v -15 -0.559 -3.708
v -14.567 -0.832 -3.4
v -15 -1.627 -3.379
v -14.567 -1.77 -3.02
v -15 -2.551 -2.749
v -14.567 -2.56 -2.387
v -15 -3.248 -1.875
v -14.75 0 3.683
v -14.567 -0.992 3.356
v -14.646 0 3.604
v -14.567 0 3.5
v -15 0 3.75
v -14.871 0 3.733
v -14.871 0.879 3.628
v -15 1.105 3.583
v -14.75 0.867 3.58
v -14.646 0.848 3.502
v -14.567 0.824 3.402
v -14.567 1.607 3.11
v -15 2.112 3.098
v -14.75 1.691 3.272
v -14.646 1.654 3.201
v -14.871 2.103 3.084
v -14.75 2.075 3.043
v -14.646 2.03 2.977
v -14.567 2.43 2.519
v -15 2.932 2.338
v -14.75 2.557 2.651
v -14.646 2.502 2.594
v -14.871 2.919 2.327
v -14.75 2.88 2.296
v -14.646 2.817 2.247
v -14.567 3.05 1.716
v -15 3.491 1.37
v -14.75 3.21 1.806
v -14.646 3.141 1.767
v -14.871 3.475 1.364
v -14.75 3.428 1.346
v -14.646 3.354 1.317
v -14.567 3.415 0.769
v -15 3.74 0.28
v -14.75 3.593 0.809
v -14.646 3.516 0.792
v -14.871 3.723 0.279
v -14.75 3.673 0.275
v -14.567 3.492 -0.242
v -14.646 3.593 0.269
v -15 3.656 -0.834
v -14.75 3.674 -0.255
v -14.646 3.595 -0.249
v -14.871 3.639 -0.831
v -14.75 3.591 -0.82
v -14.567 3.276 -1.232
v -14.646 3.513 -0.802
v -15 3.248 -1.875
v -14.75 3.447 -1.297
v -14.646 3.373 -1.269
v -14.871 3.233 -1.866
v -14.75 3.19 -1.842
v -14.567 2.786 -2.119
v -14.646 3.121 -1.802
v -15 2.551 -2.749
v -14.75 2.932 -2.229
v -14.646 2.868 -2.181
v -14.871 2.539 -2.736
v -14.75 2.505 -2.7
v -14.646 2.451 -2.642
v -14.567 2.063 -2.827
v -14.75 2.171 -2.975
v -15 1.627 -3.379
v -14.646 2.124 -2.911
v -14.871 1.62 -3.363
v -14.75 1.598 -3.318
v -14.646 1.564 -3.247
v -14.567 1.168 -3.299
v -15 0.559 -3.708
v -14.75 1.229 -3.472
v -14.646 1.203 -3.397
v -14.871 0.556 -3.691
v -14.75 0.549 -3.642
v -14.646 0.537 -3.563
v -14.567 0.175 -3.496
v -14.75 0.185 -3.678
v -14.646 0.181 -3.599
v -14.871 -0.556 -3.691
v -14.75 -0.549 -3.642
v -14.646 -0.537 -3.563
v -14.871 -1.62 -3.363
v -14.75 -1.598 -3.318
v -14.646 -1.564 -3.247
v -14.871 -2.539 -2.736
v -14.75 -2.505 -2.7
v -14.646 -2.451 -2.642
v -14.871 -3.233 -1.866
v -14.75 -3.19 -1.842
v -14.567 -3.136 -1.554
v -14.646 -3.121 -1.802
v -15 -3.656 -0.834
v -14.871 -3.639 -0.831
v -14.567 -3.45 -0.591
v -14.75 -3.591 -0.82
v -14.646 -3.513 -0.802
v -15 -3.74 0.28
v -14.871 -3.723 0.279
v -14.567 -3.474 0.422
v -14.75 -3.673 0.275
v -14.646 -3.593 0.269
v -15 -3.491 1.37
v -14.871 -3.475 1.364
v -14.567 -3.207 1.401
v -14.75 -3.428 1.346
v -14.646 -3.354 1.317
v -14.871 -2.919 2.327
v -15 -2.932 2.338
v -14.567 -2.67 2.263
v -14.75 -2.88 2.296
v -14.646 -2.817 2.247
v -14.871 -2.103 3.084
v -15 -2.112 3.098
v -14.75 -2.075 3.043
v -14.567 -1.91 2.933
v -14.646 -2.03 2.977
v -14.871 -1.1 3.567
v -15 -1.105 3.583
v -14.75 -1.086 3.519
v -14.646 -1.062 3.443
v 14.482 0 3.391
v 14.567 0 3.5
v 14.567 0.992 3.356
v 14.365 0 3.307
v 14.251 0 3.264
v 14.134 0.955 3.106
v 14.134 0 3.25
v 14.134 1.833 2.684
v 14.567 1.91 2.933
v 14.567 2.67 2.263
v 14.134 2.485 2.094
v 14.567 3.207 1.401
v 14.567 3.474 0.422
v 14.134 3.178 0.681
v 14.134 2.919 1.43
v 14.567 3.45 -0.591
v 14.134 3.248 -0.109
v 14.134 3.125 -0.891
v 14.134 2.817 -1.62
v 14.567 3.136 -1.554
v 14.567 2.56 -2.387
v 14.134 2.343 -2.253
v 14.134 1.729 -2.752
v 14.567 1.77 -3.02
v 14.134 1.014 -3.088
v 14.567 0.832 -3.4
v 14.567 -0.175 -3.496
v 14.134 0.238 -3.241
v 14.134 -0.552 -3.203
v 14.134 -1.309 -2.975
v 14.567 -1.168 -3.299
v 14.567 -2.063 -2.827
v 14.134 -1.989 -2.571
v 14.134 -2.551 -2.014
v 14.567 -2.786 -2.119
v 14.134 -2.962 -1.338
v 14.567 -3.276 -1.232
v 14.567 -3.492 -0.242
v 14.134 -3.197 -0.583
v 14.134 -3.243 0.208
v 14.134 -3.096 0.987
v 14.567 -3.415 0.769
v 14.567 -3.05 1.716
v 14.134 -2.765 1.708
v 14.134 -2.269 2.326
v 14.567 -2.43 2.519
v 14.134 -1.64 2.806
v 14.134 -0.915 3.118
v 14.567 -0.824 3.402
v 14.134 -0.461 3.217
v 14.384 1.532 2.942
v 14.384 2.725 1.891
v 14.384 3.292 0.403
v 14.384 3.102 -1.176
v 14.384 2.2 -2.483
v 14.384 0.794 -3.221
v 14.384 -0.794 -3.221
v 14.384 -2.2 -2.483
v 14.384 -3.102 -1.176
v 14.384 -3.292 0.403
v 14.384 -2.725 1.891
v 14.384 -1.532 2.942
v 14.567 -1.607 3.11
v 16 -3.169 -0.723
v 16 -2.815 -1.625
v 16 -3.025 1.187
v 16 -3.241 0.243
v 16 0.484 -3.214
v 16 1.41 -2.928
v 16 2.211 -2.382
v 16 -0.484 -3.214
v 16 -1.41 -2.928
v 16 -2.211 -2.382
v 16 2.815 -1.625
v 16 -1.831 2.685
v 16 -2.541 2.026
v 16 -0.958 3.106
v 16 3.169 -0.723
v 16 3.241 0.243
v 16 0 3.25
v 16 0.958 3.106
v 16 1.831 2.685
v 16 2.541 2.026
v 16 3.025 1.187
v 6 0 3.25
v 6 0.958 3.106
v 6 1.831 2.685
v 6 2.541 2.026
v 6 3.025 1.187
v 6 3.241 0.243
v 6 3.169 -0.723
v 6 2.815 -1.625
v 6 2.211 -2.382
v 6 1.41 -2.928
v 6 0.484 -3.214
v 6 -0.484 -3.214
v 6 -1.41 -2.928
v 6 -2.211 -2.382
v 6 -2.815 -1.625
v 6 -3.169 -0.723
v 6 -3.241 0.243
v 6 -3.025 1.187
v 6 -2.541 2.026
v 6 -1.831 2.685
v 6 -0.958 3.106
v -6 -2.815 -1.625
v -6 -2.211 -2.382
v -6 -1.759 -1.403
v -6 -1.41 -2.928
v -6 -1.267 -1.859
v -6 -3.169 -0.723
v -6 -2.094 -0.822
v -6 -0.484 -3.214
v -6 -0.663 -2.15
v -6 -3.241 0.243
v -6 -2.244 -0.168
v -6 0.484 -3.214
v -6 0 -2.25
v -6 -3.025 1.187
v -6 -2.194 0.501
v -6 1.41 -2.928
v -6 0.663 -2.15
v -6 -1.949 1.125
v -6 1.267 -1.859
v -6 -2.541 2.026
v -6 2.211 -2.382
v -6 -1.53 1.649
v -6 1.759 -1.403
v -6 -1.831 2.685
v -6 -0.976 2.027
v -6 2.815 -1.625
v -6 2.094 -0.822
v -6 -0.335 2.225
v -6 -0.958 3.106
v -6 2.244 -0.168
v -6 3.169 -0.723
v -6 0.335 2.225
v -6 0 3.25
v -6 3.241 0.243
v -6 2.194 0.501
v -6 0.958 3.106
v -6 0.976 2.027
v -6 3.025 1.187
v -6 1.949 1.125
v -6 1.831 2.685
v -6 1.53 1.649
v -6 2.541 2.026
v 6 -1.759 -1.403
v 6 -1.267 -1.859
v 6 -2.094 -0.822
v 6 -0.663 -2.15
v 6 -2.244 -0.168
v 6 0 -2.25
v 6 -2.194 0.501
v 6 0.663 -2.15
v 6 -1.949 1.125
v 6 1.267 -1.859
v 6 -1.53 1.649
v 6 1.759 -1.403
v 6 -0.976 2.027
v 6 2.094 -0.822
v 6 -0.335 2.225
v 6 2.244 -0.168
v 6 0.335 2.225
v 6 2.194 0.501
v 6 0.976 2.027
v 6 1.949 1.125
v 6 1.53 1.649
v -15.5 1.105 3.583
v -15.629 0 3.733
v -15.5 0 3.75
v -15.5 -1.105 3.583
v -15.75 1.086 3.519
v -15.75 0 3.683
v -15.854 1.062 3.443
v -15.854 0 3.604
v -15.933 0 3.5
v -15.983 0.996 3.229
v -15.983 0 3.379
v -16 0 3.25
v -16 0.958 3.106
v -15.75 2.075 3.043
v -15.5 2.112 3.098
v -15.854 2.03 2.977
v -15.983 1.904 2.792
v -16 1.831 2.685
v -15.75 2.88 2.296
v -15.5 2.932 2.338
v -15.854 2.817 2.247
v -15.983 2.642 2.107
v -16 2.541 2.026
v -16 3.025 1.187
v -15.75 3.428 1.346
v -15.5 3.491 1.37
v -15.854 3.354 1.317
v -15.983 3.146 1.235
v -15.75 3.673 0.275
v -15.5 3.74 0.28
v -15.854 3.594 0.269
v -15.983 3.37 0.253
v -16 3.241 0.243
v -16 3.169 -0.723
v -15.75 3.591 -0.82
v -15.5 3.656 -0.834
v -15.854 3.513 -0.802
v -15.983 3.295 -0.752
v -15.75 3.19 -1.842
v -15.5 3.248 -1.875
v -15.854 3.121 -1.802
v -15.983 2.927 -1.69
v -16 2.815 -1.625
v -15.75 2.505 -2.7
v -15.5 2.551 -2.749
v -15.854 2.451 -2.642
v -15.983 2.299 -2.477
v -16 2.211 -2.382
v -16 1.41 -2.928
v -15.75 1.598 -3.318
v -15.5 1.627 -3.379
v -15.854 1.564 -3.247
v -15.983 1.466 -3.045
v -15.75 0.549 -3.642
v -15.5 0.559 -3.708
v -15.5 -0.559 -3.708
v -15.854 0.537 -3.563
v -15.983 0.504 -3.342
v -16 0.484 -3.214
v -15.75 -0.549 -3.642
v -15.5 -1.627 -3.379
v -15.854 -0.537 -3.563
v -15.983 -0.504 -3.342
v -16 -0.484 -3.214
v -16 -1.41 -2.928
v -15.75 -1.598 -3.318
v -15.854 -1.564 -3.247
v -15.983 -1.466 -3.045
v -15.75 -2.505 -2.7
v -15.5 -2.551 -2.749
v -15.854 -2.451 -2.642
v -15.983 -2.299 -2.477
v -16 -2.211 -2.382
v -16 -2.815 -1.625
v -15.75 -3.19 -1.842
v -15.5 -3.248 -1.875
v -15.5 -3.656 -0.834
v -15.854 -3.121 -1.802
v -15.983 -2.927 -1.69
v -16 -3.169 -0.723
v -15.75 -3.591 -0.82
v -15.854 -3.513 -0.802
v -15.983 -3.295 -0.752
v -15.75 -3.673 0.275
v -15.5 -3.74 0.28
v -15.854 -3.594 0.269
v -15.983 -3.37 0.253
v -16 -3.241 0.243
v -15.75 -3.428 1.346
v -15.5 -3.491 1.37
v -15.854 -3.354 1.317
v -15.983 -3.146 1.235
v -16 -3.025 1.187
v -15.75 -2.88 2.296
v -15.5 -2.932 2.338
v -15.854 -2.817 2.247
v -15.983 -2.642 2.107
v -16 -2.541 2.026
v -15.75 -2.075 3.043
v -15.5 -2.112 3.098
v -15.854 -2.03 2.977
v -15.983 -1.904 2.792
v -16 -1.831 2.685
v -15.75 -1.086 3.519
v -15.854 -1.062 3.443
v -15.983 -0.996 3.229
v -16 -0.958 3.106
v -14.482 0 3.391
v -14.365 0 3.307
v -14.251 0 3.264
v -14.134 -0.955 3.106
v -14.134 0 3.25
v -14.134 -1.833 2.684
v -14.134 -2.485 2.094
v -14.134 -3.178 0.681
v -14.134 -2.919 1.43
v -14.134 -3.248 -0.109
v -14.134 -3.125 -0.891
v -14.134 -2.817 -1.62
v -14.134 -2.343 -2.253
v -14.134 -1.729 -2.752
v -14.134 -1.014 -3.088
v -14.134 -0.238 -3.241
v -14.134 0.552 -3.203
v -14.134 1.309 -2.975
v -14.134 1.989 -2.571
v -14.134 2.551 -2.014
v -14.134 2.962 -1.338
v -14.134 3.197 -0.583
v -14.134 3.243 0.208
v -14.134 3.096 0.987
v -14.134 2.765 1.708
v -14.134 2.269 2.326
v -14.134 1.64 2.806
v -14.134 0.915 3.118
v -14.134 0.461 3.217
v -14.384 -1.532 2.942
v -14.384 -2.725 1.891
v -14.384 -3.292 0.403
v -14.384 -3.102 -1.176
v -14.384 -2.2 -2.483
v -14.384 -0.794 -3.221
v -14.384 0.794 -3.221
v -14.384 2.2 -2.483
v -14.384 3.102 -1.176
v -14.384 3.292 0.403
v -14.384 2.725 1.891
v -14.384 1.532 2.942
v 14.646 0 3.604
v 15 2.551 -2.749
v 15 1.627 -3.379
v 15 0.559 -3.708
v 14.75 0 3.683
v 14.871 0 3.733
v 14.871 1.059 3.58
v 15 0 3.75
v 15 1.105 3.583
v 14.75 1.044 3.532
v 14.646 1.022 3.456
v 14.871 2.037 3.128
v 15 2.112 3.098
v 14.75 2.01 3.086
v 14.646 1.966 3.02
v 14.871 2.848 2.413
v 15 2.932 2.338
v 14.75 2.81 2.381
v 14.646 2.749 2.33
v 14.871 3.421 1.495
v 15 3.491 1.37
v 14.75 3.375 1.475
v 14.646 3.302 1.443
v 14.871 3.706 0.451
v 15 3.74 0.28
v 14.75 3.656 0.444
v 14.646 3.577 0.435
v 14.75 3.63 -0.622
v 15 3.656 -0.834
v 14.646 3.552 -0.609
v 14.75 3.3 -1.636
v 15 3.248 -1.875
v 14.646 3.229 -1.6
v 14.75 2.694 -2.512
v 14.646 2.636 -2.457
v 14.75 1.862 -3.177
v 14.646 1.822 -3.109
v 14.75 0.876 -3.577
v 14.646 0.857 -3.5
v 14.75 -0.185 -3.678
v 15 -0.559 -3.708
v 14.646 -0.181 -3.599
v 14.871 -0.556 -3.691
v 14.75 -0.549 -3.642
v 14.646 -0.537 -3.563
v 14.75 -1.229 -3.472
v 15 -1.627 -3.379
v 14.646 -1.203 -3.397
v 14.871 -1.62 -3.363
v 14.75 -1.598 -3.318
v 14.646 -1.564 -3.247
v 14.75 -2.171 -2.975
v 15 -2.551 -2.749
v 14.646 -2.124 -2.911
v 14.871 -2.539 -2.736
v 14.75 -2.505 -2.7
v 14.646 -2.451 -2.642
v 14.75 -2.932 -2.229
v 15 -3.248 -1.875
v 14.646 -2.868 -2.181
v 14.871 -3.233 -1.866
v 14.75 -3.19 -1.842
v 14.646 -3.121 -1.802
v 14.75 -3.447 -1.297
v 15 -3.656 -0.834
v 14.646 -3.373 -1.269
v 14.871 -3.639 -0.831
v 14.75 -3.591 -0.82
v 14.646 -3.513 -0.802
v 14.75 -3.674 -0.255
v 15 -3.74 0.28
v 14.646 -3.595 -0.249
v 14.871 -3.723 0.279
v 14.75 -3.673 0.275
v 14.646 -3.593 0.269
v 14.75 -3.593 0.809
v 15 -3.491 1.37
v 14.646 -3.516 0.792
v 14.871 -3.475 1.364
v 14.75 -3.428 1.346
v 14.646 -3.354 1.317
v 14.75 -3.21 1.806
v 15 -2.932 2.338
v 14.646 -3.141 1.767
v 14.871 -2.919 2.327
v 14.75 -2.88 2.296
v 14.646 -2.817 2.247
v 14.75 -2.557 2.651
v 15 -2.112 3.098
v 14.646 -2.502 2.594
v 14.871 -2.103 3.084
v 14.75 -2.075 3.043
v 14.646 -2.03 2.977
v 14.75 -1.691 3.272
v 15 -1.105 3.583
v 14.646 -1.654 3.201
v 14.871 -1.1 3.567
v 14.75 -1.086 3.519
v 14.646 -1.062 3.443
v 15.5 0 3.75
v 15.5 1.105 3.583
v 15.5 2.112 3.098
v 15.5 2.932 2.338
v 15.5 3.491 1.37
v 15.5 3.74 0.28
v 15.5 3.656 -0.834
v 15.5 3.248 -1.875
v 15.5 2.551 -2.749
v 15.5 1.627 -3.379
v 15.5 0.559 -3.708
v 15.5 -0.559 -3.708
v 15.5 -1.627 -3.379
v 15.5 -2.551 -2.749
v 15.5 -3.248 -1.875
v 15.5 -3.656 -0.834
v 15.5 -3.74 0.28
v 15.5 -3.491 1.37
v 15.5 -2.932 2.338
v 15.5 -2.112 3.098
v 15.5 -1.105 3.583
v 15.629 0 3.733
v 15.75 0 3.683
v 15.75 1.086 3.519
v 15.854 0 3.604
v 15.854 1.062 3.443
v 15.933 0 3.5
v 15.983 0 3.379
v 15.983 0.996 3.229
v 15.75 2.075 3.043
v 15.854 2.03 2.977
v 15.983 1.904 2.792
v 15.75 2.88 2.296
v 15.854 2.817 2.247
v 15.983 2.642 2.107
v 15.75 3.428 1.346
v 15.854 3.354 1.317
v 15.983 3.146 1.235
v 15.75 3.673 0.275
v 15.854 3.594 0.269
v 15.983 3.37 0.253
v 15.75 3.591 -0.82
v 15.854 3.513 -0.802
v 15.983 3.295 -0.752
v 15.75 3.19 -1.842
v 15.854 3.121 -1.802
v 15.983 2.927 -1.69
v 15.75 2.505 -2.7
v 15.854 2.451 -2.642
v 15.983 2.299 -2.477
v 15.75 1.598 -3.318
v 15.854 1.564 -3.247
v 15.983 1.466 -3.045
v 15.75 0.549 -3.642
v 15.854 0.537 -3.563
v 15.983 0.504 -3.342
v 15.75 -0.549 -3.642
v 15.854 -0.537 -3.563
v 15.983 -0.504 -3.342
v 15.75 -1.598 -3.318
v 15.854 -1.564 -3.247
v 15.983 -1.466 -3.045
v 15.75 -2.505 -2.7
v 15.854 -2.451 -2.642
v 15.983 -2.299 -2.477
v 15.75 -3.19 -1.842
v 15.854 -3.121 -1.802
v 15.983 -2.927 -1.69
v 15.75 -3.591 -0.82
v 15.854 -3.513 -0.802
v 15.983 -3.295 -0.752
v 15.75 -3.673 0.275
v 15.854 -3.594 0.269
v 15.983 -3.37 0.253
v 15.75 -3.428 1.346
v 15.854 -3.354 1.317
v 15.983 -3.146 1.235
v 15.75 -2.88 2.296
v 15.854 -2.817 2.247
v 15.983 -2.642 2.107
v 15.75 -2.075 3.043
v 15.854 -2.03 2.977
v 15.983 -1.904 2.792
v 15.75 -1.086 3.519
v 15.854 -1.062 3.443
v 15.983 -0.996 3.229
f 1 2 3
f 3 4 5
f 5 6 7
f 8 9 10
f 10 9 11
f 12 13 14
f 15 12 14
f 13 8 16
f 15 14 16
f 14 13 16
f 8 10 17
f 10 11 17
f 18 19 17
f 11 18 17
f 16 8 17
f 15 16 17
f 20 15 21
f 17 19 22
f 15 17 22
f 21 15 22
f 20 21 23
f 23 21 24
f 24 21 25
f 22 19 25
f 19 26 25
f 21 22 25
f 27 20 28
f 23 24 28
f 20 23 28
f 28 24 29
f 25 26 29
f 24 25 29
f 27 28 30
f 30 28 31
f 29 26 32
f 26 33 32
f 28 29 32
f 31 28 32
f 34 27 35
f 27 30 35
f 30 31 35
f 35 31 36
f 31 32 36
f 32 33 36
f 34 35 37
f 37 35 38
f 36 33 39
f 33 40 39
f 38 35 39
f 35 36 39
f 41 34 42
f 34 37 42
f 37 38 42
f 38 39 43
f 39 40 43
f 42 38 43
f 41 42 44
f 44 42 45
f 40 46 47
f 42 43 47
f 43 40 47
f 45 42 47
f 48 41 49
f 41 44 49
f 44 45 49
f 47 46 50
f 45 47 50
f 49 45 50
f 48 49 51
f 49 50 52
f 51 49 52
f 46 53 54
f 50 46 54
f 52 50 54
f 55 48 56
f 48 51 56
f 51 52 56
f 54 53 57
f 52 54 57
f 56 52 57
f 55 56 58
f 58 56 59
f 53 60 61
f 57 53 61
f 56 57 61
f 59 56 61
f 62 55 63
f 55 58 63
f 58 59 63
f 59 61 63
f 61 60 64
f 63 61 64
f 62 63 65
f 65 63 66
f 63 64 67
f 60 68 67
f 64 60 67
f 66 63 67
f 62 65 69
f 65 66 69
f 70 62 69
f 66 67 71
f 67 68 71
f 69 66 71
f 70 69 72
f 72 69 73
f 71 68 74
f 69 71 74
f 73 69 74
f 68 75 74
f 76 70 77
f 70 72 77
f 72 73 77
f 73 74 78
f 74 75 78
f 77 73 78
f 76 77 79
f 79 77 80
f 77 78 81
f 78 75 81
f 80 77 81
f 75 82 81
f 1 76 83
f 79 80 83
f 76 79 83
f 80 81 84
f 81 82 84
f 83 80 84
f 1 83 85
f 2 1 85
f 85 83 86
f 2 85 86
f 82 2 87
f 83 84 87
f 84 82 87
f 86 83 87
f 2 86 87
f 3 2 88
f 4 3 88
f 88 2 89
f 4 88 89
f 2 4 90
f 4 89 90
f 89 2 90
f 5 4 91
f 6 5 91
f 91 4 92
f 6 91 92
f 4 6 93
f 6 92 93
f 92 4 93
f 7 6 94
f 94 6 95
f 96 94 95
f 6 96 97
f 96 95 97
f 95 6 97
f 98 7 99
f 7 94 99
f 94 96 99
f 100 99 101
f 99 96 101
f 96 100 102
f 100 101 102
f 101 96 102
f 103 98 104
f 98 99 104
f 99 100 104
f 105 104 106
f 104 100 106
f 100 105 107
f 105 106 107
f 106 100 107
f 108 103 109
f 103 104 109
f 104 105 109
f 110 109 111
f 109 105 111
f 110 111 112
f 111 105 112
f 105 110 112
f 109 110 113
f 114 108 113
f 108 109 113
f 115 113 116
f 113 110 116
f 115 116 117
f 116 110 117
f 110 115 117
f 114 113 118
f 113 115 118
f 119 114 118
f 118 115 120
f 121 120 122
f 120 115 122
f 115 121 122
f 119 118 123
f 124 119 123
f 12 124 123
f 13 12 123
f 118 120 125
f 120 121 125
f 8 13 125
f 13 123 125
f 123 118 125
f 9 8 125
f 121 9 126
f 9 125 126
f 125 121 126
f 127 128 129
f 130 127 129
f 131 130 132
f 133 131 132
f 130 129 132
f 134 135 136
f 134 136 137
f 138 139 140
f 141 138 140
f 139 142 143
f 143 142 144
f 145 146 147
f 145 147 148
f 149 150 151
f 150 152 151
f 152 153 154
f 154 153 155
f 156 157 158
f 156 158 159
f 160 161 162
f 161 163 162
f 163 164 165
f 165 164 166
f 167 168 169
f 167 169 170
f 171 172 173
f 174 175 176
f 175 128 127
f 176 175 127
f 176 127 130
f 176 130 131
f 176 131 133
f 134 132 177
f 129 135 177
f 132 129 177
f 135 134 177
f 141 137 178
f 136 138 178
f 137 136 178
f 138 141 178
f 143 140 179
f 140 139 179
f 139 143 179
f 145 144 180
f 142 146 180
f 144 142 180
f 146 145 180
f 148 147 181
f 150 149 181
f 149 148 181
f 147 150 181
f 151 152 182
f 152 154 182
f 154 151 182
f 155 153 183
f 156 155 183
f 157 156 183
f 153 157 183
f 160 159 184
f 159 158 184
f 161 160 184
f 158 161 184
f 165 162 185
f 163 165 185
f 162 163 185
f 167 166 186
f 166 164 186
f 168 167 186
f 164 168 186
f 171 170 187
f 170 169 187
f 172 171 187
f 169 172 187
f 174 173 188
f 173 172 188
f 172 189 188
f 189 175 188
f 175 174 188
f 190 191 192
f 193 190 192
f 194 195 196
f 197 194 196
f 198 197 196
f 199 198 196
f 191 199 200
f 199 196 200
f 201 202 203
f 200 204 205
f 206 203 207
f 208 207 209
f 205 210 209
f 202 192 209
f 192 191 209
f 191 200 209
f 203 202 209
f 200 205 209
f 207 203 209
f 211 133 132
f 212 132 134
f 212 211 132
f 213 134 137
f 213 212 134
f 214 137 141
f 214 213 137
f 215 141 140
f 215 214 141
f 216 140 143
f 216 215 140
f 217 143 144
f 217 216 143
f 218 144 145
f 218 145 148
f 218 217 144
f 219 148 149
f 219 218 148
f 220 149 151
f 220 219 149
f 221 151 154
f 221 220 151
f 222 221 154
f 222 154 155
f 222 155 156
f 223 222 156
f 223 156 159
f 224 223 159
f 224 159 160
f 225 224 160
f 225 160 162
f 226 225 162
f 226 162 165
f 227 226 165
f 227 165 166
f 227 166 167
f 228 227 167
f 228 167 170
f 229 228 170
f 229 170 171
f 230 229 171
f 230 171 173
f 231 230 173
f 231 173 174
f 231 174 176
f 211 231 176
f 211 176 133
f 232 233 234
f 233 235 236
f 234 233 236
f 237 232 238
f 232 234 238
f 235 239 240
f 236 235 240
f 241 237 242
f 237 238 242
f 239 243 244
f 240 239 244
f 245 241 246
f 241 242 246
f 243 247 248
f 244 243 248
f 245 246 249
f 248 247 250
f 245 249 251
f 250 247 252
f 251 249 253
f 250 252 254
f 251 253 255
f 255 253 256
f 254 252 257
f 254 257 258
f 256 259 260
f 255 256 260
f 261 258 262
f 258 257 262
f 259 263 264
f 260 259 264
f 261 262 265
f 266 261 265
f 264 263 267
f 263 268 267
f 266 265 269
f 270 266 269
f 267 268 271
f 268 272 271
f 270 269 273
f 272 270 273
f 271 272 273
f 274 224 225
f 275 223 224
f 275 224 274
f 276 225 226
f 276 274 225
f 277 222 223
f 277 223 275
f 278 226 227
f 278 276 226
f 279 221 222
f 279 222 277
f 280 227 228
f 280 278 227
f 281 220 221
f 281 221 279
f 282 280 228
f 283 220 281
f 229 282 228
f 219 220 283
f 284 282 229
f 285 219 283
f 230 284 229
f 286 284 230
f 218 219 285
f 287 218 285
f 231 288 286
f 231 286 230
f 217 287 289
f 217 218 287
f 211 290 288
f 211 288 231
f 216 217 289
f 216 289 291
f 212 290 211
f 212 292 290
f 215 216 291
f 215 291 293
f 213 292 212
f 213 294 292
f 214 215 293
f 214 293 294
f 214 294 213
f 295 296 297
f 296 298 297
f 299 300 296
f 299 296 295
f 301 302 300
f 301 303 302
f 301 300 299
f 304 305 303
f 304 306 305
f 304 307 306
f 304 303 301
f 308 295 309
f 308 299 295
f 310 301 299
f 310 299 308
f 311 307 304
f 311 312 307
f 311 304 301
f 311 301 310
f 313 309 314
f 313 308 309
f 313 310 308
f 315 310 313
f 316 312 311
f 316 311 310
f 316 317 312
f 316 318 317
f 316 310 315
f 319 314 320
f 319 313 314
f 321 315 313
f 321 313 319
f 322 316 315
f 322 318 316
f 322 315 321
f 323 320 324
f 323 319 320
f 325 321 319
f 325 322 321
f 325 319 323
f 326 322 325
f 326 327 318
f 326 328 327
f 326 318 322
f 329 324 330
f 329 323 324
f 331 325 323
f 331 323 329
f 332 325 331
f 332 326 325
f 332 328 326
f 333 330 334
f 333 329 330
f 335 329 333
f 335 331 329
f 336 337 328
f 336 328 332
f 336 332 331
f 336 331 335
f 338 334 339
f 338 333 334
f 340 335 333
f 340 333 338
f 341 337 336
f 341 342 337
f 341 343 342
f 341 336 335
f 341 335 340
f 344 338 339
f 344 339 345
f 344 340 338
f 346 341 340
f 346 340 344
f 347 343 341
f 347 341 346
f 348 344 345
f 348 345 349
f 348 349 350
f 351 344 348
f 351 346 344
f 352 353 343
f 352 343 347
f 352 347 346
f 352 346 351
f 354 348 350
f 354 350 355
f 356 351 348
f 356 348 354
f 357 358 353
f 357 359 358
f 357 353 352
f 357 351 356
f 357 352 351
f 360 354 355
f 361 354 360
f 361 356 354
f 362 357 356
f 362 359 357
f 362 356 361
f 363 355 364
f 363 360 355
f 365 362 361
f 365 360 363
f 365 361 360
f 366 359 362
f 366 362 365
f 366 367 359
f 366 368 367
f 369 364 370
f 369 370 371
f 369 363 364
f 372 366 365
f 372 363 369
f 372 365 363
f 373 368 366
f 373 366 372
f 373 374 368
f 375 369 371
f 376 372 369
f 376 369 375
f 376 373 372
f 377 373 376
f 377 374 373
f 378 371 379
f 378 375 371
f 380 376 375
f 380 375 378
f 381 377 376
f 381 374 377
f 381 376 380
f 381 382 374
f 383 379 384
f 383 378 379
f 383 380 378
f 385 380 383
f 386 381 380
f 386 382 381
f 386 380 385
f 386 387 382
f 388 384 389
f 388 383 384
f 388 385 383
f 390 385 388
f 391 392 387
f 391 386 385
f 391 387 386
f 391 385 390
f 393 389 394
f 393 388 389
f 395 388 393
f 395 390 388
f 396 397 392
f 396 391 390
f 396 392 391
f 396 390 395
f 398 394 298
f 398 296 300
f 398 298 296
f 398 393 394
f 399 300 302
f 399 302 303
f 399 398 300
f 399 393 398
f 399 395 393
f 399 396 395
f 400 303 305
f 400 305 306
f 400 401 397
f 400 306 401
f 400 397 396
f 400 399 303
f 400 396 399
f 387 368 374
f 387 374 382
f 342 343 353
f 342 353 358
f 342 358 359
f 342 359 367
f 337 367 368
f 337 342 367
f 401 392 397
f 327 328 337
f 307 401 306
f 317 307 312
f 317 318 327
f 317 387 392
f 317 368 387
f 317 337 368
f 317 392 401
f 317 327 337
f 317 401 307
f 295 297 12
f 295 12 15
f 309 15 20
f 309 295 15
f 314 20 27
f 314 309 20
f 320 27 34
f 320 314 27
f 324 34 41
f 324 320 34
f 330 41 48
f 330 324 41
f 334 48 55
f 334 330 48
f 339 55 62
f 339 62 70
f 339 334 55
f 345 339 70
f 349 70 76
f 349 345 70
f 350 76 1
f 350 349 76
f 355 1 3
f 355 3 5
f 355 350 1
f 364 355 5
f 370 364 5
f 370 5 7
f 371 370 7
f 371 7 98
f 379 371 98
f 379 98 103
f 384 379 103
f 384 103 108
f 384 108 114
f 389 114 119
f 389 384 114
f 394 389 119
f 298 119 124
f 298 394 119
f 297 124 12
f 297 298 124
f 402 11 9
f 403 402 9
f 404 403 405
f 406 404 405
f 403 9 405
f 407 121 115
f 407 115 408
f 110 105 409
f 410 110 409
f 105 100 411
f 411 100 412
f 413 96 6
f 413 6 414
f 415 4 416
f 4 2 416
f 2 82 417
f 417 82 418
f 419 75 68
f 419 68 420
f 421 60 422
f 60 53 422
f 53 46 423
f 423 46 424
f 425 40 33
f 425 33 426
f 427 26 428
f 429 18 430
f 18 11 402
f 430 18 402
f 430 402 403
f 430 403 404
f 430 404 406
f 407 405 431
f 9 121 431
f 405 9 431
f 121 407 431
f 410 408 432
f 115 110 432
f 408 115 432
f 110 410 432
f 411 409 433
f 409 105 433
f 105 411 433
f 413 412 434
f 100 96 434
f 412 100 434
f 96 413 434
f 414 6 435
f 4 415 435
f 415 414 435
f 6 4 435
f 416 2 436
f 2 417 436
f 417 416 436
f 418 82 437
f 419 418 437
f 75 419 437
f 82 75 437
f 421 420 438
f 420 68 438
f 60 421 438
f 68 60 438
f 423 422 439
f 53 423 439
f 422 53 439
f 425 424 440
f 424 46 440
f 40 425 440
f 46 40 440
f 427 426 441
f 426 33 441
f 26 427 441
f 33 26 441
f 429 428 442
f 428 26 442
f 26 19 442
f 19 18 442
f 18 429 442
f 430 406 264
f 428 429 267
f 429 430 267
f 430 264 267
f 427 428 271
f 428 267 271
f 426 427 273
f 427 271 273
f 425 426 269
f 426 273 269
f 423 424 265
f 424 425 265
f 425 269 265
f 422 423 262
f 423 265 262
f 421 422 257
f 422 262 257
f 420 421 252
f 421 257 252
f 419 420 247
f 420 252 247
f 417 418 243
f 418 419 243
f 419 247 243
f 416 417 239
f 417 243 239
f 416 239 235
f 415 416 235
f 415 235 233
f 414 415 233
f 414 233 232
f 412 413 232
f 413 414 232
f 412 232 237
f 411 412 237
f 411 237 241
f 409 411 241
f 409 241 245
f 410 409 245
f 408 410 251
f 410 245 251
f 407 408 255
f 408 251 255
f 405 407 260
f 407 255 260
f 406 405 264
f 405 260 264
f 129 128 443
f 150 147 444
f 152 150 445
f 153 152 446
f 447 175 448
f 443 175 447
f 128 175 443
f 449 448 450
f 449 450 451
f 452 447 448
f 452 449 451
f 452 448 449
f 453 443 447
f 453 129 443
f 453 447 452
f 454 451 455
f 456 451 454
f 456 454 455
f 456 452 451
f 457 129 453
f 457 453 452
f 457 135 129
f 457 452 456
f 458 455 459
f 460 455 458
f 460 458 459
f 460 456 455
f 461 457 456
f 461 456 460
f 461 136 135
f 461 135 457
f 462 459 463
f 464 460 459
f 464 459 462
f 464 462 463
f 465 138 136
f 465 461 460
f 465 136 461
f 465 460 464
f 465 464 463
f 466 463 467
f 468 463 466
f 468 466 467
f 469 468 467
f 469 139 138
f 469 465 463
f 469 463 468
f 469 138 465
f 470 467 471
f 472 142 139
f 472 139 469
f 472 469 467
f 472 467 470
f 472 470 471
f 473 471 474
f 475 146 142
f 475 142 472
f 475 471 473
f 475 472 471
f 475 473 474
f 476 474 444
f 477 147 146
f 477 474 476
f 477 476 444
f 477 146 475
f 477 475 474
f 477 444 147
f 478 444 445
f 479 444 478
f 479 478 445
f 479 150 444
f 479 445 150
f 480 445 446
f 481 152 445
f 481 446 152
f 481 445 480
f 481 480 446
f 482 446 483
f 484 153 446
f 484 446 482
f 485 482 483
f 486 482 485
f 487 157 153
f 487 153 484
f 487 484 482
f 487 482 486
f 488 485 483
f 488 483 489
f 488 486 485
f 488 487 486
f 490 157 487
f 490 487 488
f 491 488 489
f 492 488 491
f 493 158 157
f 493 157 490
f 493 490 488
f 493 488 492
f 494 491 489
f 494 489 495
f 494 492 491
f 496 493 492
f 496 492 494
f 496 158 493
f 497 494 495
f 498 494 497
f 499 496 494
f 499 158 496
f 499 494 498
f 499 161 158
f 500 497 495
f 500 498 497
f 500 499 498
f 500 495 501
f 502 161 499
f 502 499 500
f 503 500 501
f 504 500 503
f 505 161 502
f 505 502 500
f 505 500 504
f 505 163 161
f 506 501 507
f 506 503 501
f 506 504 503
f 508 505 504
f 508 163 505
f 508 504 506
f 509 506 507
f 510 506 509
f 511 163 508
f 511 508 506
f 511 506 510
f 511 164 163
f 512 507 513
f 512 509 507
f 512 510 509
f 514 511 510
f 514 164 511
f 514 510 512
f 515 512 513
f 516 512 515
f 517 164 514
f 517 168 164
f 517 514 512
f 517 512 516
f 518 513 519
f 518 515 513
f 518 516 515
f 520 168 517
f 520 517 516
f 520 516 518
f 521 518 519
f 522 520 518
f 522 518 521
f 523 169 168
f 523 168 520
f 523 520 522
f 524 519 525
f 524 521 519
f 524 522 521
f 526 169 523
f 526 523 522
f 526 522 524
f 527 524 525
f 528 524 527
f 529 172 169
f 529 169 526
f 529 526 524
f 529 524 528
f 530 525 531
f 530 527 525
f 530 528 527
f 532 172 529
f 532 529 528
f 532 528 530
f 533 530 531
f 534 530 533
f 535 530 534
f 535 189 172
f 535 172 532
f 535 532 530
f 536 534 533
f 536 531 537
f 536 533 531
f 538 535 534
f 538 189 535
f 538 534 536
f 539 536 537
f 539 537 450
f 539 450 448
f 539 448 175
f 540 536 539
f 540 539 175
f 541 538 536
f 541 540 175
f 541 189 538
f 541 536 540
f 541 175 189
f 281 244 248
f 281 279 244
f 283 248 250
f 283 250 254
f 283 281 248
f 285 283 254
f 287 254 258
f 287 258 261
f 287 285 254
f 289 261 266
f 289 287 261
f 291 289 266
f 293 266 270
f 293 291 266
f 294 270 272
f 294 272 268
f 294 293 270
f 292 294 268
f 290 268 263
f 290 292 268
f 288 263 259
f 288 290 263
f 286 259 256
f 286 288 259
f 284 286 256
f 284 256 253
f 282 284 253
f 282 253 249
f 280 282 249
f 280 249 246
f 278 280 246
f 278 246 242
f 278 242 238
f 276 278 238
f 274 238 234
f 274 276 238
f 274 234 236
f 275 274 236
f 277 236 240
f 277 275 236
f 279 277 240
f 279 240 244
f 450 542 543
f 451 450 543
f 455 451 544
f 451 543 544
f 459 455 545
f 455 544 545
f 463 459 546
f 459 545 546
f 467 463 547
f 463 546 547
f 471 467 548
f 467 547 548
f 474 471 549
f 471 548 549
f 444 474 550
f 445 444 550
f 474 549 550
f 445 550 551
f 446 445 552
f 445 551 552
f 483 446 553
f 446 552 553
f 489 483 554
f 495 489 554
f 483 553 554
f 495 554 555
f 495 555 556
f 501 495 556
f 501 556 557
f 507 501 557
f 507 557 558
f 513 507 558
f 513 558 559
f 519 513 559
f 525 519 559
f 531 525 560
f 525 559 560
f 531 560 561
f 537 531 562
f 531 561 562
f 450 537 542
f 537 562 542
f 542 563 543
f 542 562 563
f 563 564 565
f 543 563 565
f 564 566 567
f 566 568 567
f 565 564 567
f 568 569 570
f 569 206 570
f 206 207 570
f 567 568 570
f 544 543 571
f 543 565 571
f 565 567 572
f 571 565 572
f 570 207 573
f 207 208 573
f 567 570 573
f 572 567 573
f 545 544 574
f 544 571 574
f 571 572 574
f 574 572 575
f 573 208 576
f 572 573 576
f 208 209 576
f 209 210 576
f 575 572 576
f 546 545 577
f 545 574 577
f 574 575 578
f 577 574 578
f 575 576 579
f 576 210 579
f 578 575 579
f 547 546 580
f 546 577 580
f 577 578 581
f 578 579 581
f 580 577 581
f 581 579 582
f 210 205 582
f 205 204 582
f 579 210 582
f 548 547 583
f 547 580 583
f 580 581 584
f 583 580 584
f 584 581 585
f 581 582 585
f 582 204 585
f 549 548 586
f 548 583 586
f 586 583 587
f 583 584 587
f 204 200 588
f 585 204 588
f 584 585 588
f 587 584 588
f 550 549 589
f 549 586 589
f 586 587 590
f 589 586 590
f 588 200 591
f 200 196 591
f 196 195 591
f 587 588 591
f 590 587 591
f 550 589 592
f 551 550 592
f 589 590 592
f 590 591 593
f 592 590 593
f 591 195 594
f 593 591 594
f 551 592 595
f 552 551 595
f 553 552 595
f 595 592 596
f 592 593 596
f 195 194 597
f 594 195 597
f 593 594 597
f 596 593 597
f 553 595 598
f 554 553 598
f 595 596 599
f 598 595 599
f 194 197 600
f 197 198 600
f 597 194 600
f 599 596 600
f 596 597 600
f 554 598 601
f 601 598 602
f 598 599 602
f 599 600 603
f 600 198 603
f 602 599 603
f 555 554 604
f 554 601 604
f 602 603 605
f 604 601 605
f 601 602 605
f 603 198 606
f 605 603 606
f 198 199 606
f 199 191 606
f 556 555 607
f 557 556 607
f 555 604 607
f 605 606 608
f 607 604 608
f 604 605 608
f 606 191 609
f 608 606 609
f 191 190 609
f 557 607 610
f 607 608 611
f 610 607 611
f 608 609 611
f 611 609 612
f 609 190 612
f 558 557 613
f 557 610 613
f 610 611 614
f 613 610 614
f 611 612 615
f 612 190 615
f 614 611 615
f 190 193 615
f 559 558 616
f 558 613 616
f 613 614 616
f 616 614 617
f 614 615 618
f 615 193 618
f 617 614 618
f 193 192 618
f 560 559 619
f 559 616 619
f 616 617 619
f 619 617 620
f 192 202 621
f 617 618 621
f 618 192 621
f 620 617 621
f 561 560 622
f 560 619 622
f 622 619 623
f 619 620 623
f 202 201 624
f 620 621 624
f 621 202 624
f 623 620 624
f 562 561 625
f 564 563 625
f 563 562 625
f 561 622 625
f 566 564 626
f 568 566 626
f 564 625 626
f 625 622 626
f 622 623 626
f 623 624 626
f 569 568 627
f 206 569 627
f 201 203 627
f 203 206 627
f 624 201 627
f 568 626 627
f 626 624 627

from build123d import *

# Parameters (mm, degrees)
SKETCH1_R            = 2.25
BOSS_EXTRUDE1_DEPTH  = 6
SKETCH2_R            = 3.25
BOSS_EXTRUDE2_DEPTH  = 10
SKETCH3_R            = 3.75
BOSS_EXTRUDE3_DEPTH  = 1.5
FILLET1_R            = 0.5
FILLET2_R            = 0.5
FILLET1_OF_MIRROR1_R = 0.5
FILLET2_OF_MIRROR1_R = 0.5


with BuildPart() as part:
    # Sketch1 → Boss-Extrude1 (new, symmetric)
    with BuildSketch(Plane(origin=(0, 0, 0), x_dir=(0, 0, -1), z_dir=(1, 0, 0))):
        Circle(SKETCH1_R)
    extrude(amount=BOSS_EXTRUDE1_DEPTH, both=True)

    # Sketch2 → Boss-Extrude2 (add)
    with BuildSketch(Plane.ZY.offset(6)):
        Circle(SKETCH2_R)
    boss_extrude2 = extrude(amount=BOSS_EXTRUDE2_DEPTH)

    # Sketch3 → Boss-Extrude3 (add)
    with BuildSketch(Plane.ZY.offset(16)):
        Circle(SKETCH3_R)
    boss_extrude3 = extrude(amount=-BOSS_EXTRUDE3_DEPTH)

    # Fillet1
    fillet1_edges = [part.edges().sort_by_distance(p)[0] for p in [
        (-14.5, 0, -3.75),
        (-16, 0, -3.75),
    ]]
    fillet(fillet1_edges, radius=FILLET1_R - 0.0001)  # a hair under: the kernel refuses the full size

    # Fillet2
    fillet2_edges = [part.edges().sort_by_distance(p)[0] for p in [
        (-14.5, 0, -3.25),
    ]]
    fillet(fillet2_edges, radius=FILLET2_R)

    # Mirror1: Boss-Extrude2, Boss-Extrude3 across plane
    add(boss_extrude2.mirror(Plane(origin=(0, 0, 0), x_dir=(0, 0, 1), z_dir=(1, 0, 0))))
    add(boss_extrude3.mirror(Plane(origin=(0, 0, 0), x_dir=(0, 0, 1), z_dir=(1, 0, 0))))

    # Fillet1 of Mirror1
    fillet1_of_mirror1_edges = [part.edges().sort_by_distance(p)[0] for p in [
        (14.5, 0, -3.75),
        (16, 0, -3.75),
    ]]
    fillet(fillet1_of_mirror1_edges, radius=FILLET1_OF_MIRROR1_R - 0.0001)  # a hair under: the kernel refuses the full size

    # Fillet2 of Mirror1
    fillet2_of_mirror1_edges = [part.edges().sort_by_distance(p)[0] for p in [
        (14.5, 0, -3.25),
    ]]
    fillet(fillet2_of_mirror1_edges, radius=FILLET2_OF_MIRROR1_R)


solid = part.part
